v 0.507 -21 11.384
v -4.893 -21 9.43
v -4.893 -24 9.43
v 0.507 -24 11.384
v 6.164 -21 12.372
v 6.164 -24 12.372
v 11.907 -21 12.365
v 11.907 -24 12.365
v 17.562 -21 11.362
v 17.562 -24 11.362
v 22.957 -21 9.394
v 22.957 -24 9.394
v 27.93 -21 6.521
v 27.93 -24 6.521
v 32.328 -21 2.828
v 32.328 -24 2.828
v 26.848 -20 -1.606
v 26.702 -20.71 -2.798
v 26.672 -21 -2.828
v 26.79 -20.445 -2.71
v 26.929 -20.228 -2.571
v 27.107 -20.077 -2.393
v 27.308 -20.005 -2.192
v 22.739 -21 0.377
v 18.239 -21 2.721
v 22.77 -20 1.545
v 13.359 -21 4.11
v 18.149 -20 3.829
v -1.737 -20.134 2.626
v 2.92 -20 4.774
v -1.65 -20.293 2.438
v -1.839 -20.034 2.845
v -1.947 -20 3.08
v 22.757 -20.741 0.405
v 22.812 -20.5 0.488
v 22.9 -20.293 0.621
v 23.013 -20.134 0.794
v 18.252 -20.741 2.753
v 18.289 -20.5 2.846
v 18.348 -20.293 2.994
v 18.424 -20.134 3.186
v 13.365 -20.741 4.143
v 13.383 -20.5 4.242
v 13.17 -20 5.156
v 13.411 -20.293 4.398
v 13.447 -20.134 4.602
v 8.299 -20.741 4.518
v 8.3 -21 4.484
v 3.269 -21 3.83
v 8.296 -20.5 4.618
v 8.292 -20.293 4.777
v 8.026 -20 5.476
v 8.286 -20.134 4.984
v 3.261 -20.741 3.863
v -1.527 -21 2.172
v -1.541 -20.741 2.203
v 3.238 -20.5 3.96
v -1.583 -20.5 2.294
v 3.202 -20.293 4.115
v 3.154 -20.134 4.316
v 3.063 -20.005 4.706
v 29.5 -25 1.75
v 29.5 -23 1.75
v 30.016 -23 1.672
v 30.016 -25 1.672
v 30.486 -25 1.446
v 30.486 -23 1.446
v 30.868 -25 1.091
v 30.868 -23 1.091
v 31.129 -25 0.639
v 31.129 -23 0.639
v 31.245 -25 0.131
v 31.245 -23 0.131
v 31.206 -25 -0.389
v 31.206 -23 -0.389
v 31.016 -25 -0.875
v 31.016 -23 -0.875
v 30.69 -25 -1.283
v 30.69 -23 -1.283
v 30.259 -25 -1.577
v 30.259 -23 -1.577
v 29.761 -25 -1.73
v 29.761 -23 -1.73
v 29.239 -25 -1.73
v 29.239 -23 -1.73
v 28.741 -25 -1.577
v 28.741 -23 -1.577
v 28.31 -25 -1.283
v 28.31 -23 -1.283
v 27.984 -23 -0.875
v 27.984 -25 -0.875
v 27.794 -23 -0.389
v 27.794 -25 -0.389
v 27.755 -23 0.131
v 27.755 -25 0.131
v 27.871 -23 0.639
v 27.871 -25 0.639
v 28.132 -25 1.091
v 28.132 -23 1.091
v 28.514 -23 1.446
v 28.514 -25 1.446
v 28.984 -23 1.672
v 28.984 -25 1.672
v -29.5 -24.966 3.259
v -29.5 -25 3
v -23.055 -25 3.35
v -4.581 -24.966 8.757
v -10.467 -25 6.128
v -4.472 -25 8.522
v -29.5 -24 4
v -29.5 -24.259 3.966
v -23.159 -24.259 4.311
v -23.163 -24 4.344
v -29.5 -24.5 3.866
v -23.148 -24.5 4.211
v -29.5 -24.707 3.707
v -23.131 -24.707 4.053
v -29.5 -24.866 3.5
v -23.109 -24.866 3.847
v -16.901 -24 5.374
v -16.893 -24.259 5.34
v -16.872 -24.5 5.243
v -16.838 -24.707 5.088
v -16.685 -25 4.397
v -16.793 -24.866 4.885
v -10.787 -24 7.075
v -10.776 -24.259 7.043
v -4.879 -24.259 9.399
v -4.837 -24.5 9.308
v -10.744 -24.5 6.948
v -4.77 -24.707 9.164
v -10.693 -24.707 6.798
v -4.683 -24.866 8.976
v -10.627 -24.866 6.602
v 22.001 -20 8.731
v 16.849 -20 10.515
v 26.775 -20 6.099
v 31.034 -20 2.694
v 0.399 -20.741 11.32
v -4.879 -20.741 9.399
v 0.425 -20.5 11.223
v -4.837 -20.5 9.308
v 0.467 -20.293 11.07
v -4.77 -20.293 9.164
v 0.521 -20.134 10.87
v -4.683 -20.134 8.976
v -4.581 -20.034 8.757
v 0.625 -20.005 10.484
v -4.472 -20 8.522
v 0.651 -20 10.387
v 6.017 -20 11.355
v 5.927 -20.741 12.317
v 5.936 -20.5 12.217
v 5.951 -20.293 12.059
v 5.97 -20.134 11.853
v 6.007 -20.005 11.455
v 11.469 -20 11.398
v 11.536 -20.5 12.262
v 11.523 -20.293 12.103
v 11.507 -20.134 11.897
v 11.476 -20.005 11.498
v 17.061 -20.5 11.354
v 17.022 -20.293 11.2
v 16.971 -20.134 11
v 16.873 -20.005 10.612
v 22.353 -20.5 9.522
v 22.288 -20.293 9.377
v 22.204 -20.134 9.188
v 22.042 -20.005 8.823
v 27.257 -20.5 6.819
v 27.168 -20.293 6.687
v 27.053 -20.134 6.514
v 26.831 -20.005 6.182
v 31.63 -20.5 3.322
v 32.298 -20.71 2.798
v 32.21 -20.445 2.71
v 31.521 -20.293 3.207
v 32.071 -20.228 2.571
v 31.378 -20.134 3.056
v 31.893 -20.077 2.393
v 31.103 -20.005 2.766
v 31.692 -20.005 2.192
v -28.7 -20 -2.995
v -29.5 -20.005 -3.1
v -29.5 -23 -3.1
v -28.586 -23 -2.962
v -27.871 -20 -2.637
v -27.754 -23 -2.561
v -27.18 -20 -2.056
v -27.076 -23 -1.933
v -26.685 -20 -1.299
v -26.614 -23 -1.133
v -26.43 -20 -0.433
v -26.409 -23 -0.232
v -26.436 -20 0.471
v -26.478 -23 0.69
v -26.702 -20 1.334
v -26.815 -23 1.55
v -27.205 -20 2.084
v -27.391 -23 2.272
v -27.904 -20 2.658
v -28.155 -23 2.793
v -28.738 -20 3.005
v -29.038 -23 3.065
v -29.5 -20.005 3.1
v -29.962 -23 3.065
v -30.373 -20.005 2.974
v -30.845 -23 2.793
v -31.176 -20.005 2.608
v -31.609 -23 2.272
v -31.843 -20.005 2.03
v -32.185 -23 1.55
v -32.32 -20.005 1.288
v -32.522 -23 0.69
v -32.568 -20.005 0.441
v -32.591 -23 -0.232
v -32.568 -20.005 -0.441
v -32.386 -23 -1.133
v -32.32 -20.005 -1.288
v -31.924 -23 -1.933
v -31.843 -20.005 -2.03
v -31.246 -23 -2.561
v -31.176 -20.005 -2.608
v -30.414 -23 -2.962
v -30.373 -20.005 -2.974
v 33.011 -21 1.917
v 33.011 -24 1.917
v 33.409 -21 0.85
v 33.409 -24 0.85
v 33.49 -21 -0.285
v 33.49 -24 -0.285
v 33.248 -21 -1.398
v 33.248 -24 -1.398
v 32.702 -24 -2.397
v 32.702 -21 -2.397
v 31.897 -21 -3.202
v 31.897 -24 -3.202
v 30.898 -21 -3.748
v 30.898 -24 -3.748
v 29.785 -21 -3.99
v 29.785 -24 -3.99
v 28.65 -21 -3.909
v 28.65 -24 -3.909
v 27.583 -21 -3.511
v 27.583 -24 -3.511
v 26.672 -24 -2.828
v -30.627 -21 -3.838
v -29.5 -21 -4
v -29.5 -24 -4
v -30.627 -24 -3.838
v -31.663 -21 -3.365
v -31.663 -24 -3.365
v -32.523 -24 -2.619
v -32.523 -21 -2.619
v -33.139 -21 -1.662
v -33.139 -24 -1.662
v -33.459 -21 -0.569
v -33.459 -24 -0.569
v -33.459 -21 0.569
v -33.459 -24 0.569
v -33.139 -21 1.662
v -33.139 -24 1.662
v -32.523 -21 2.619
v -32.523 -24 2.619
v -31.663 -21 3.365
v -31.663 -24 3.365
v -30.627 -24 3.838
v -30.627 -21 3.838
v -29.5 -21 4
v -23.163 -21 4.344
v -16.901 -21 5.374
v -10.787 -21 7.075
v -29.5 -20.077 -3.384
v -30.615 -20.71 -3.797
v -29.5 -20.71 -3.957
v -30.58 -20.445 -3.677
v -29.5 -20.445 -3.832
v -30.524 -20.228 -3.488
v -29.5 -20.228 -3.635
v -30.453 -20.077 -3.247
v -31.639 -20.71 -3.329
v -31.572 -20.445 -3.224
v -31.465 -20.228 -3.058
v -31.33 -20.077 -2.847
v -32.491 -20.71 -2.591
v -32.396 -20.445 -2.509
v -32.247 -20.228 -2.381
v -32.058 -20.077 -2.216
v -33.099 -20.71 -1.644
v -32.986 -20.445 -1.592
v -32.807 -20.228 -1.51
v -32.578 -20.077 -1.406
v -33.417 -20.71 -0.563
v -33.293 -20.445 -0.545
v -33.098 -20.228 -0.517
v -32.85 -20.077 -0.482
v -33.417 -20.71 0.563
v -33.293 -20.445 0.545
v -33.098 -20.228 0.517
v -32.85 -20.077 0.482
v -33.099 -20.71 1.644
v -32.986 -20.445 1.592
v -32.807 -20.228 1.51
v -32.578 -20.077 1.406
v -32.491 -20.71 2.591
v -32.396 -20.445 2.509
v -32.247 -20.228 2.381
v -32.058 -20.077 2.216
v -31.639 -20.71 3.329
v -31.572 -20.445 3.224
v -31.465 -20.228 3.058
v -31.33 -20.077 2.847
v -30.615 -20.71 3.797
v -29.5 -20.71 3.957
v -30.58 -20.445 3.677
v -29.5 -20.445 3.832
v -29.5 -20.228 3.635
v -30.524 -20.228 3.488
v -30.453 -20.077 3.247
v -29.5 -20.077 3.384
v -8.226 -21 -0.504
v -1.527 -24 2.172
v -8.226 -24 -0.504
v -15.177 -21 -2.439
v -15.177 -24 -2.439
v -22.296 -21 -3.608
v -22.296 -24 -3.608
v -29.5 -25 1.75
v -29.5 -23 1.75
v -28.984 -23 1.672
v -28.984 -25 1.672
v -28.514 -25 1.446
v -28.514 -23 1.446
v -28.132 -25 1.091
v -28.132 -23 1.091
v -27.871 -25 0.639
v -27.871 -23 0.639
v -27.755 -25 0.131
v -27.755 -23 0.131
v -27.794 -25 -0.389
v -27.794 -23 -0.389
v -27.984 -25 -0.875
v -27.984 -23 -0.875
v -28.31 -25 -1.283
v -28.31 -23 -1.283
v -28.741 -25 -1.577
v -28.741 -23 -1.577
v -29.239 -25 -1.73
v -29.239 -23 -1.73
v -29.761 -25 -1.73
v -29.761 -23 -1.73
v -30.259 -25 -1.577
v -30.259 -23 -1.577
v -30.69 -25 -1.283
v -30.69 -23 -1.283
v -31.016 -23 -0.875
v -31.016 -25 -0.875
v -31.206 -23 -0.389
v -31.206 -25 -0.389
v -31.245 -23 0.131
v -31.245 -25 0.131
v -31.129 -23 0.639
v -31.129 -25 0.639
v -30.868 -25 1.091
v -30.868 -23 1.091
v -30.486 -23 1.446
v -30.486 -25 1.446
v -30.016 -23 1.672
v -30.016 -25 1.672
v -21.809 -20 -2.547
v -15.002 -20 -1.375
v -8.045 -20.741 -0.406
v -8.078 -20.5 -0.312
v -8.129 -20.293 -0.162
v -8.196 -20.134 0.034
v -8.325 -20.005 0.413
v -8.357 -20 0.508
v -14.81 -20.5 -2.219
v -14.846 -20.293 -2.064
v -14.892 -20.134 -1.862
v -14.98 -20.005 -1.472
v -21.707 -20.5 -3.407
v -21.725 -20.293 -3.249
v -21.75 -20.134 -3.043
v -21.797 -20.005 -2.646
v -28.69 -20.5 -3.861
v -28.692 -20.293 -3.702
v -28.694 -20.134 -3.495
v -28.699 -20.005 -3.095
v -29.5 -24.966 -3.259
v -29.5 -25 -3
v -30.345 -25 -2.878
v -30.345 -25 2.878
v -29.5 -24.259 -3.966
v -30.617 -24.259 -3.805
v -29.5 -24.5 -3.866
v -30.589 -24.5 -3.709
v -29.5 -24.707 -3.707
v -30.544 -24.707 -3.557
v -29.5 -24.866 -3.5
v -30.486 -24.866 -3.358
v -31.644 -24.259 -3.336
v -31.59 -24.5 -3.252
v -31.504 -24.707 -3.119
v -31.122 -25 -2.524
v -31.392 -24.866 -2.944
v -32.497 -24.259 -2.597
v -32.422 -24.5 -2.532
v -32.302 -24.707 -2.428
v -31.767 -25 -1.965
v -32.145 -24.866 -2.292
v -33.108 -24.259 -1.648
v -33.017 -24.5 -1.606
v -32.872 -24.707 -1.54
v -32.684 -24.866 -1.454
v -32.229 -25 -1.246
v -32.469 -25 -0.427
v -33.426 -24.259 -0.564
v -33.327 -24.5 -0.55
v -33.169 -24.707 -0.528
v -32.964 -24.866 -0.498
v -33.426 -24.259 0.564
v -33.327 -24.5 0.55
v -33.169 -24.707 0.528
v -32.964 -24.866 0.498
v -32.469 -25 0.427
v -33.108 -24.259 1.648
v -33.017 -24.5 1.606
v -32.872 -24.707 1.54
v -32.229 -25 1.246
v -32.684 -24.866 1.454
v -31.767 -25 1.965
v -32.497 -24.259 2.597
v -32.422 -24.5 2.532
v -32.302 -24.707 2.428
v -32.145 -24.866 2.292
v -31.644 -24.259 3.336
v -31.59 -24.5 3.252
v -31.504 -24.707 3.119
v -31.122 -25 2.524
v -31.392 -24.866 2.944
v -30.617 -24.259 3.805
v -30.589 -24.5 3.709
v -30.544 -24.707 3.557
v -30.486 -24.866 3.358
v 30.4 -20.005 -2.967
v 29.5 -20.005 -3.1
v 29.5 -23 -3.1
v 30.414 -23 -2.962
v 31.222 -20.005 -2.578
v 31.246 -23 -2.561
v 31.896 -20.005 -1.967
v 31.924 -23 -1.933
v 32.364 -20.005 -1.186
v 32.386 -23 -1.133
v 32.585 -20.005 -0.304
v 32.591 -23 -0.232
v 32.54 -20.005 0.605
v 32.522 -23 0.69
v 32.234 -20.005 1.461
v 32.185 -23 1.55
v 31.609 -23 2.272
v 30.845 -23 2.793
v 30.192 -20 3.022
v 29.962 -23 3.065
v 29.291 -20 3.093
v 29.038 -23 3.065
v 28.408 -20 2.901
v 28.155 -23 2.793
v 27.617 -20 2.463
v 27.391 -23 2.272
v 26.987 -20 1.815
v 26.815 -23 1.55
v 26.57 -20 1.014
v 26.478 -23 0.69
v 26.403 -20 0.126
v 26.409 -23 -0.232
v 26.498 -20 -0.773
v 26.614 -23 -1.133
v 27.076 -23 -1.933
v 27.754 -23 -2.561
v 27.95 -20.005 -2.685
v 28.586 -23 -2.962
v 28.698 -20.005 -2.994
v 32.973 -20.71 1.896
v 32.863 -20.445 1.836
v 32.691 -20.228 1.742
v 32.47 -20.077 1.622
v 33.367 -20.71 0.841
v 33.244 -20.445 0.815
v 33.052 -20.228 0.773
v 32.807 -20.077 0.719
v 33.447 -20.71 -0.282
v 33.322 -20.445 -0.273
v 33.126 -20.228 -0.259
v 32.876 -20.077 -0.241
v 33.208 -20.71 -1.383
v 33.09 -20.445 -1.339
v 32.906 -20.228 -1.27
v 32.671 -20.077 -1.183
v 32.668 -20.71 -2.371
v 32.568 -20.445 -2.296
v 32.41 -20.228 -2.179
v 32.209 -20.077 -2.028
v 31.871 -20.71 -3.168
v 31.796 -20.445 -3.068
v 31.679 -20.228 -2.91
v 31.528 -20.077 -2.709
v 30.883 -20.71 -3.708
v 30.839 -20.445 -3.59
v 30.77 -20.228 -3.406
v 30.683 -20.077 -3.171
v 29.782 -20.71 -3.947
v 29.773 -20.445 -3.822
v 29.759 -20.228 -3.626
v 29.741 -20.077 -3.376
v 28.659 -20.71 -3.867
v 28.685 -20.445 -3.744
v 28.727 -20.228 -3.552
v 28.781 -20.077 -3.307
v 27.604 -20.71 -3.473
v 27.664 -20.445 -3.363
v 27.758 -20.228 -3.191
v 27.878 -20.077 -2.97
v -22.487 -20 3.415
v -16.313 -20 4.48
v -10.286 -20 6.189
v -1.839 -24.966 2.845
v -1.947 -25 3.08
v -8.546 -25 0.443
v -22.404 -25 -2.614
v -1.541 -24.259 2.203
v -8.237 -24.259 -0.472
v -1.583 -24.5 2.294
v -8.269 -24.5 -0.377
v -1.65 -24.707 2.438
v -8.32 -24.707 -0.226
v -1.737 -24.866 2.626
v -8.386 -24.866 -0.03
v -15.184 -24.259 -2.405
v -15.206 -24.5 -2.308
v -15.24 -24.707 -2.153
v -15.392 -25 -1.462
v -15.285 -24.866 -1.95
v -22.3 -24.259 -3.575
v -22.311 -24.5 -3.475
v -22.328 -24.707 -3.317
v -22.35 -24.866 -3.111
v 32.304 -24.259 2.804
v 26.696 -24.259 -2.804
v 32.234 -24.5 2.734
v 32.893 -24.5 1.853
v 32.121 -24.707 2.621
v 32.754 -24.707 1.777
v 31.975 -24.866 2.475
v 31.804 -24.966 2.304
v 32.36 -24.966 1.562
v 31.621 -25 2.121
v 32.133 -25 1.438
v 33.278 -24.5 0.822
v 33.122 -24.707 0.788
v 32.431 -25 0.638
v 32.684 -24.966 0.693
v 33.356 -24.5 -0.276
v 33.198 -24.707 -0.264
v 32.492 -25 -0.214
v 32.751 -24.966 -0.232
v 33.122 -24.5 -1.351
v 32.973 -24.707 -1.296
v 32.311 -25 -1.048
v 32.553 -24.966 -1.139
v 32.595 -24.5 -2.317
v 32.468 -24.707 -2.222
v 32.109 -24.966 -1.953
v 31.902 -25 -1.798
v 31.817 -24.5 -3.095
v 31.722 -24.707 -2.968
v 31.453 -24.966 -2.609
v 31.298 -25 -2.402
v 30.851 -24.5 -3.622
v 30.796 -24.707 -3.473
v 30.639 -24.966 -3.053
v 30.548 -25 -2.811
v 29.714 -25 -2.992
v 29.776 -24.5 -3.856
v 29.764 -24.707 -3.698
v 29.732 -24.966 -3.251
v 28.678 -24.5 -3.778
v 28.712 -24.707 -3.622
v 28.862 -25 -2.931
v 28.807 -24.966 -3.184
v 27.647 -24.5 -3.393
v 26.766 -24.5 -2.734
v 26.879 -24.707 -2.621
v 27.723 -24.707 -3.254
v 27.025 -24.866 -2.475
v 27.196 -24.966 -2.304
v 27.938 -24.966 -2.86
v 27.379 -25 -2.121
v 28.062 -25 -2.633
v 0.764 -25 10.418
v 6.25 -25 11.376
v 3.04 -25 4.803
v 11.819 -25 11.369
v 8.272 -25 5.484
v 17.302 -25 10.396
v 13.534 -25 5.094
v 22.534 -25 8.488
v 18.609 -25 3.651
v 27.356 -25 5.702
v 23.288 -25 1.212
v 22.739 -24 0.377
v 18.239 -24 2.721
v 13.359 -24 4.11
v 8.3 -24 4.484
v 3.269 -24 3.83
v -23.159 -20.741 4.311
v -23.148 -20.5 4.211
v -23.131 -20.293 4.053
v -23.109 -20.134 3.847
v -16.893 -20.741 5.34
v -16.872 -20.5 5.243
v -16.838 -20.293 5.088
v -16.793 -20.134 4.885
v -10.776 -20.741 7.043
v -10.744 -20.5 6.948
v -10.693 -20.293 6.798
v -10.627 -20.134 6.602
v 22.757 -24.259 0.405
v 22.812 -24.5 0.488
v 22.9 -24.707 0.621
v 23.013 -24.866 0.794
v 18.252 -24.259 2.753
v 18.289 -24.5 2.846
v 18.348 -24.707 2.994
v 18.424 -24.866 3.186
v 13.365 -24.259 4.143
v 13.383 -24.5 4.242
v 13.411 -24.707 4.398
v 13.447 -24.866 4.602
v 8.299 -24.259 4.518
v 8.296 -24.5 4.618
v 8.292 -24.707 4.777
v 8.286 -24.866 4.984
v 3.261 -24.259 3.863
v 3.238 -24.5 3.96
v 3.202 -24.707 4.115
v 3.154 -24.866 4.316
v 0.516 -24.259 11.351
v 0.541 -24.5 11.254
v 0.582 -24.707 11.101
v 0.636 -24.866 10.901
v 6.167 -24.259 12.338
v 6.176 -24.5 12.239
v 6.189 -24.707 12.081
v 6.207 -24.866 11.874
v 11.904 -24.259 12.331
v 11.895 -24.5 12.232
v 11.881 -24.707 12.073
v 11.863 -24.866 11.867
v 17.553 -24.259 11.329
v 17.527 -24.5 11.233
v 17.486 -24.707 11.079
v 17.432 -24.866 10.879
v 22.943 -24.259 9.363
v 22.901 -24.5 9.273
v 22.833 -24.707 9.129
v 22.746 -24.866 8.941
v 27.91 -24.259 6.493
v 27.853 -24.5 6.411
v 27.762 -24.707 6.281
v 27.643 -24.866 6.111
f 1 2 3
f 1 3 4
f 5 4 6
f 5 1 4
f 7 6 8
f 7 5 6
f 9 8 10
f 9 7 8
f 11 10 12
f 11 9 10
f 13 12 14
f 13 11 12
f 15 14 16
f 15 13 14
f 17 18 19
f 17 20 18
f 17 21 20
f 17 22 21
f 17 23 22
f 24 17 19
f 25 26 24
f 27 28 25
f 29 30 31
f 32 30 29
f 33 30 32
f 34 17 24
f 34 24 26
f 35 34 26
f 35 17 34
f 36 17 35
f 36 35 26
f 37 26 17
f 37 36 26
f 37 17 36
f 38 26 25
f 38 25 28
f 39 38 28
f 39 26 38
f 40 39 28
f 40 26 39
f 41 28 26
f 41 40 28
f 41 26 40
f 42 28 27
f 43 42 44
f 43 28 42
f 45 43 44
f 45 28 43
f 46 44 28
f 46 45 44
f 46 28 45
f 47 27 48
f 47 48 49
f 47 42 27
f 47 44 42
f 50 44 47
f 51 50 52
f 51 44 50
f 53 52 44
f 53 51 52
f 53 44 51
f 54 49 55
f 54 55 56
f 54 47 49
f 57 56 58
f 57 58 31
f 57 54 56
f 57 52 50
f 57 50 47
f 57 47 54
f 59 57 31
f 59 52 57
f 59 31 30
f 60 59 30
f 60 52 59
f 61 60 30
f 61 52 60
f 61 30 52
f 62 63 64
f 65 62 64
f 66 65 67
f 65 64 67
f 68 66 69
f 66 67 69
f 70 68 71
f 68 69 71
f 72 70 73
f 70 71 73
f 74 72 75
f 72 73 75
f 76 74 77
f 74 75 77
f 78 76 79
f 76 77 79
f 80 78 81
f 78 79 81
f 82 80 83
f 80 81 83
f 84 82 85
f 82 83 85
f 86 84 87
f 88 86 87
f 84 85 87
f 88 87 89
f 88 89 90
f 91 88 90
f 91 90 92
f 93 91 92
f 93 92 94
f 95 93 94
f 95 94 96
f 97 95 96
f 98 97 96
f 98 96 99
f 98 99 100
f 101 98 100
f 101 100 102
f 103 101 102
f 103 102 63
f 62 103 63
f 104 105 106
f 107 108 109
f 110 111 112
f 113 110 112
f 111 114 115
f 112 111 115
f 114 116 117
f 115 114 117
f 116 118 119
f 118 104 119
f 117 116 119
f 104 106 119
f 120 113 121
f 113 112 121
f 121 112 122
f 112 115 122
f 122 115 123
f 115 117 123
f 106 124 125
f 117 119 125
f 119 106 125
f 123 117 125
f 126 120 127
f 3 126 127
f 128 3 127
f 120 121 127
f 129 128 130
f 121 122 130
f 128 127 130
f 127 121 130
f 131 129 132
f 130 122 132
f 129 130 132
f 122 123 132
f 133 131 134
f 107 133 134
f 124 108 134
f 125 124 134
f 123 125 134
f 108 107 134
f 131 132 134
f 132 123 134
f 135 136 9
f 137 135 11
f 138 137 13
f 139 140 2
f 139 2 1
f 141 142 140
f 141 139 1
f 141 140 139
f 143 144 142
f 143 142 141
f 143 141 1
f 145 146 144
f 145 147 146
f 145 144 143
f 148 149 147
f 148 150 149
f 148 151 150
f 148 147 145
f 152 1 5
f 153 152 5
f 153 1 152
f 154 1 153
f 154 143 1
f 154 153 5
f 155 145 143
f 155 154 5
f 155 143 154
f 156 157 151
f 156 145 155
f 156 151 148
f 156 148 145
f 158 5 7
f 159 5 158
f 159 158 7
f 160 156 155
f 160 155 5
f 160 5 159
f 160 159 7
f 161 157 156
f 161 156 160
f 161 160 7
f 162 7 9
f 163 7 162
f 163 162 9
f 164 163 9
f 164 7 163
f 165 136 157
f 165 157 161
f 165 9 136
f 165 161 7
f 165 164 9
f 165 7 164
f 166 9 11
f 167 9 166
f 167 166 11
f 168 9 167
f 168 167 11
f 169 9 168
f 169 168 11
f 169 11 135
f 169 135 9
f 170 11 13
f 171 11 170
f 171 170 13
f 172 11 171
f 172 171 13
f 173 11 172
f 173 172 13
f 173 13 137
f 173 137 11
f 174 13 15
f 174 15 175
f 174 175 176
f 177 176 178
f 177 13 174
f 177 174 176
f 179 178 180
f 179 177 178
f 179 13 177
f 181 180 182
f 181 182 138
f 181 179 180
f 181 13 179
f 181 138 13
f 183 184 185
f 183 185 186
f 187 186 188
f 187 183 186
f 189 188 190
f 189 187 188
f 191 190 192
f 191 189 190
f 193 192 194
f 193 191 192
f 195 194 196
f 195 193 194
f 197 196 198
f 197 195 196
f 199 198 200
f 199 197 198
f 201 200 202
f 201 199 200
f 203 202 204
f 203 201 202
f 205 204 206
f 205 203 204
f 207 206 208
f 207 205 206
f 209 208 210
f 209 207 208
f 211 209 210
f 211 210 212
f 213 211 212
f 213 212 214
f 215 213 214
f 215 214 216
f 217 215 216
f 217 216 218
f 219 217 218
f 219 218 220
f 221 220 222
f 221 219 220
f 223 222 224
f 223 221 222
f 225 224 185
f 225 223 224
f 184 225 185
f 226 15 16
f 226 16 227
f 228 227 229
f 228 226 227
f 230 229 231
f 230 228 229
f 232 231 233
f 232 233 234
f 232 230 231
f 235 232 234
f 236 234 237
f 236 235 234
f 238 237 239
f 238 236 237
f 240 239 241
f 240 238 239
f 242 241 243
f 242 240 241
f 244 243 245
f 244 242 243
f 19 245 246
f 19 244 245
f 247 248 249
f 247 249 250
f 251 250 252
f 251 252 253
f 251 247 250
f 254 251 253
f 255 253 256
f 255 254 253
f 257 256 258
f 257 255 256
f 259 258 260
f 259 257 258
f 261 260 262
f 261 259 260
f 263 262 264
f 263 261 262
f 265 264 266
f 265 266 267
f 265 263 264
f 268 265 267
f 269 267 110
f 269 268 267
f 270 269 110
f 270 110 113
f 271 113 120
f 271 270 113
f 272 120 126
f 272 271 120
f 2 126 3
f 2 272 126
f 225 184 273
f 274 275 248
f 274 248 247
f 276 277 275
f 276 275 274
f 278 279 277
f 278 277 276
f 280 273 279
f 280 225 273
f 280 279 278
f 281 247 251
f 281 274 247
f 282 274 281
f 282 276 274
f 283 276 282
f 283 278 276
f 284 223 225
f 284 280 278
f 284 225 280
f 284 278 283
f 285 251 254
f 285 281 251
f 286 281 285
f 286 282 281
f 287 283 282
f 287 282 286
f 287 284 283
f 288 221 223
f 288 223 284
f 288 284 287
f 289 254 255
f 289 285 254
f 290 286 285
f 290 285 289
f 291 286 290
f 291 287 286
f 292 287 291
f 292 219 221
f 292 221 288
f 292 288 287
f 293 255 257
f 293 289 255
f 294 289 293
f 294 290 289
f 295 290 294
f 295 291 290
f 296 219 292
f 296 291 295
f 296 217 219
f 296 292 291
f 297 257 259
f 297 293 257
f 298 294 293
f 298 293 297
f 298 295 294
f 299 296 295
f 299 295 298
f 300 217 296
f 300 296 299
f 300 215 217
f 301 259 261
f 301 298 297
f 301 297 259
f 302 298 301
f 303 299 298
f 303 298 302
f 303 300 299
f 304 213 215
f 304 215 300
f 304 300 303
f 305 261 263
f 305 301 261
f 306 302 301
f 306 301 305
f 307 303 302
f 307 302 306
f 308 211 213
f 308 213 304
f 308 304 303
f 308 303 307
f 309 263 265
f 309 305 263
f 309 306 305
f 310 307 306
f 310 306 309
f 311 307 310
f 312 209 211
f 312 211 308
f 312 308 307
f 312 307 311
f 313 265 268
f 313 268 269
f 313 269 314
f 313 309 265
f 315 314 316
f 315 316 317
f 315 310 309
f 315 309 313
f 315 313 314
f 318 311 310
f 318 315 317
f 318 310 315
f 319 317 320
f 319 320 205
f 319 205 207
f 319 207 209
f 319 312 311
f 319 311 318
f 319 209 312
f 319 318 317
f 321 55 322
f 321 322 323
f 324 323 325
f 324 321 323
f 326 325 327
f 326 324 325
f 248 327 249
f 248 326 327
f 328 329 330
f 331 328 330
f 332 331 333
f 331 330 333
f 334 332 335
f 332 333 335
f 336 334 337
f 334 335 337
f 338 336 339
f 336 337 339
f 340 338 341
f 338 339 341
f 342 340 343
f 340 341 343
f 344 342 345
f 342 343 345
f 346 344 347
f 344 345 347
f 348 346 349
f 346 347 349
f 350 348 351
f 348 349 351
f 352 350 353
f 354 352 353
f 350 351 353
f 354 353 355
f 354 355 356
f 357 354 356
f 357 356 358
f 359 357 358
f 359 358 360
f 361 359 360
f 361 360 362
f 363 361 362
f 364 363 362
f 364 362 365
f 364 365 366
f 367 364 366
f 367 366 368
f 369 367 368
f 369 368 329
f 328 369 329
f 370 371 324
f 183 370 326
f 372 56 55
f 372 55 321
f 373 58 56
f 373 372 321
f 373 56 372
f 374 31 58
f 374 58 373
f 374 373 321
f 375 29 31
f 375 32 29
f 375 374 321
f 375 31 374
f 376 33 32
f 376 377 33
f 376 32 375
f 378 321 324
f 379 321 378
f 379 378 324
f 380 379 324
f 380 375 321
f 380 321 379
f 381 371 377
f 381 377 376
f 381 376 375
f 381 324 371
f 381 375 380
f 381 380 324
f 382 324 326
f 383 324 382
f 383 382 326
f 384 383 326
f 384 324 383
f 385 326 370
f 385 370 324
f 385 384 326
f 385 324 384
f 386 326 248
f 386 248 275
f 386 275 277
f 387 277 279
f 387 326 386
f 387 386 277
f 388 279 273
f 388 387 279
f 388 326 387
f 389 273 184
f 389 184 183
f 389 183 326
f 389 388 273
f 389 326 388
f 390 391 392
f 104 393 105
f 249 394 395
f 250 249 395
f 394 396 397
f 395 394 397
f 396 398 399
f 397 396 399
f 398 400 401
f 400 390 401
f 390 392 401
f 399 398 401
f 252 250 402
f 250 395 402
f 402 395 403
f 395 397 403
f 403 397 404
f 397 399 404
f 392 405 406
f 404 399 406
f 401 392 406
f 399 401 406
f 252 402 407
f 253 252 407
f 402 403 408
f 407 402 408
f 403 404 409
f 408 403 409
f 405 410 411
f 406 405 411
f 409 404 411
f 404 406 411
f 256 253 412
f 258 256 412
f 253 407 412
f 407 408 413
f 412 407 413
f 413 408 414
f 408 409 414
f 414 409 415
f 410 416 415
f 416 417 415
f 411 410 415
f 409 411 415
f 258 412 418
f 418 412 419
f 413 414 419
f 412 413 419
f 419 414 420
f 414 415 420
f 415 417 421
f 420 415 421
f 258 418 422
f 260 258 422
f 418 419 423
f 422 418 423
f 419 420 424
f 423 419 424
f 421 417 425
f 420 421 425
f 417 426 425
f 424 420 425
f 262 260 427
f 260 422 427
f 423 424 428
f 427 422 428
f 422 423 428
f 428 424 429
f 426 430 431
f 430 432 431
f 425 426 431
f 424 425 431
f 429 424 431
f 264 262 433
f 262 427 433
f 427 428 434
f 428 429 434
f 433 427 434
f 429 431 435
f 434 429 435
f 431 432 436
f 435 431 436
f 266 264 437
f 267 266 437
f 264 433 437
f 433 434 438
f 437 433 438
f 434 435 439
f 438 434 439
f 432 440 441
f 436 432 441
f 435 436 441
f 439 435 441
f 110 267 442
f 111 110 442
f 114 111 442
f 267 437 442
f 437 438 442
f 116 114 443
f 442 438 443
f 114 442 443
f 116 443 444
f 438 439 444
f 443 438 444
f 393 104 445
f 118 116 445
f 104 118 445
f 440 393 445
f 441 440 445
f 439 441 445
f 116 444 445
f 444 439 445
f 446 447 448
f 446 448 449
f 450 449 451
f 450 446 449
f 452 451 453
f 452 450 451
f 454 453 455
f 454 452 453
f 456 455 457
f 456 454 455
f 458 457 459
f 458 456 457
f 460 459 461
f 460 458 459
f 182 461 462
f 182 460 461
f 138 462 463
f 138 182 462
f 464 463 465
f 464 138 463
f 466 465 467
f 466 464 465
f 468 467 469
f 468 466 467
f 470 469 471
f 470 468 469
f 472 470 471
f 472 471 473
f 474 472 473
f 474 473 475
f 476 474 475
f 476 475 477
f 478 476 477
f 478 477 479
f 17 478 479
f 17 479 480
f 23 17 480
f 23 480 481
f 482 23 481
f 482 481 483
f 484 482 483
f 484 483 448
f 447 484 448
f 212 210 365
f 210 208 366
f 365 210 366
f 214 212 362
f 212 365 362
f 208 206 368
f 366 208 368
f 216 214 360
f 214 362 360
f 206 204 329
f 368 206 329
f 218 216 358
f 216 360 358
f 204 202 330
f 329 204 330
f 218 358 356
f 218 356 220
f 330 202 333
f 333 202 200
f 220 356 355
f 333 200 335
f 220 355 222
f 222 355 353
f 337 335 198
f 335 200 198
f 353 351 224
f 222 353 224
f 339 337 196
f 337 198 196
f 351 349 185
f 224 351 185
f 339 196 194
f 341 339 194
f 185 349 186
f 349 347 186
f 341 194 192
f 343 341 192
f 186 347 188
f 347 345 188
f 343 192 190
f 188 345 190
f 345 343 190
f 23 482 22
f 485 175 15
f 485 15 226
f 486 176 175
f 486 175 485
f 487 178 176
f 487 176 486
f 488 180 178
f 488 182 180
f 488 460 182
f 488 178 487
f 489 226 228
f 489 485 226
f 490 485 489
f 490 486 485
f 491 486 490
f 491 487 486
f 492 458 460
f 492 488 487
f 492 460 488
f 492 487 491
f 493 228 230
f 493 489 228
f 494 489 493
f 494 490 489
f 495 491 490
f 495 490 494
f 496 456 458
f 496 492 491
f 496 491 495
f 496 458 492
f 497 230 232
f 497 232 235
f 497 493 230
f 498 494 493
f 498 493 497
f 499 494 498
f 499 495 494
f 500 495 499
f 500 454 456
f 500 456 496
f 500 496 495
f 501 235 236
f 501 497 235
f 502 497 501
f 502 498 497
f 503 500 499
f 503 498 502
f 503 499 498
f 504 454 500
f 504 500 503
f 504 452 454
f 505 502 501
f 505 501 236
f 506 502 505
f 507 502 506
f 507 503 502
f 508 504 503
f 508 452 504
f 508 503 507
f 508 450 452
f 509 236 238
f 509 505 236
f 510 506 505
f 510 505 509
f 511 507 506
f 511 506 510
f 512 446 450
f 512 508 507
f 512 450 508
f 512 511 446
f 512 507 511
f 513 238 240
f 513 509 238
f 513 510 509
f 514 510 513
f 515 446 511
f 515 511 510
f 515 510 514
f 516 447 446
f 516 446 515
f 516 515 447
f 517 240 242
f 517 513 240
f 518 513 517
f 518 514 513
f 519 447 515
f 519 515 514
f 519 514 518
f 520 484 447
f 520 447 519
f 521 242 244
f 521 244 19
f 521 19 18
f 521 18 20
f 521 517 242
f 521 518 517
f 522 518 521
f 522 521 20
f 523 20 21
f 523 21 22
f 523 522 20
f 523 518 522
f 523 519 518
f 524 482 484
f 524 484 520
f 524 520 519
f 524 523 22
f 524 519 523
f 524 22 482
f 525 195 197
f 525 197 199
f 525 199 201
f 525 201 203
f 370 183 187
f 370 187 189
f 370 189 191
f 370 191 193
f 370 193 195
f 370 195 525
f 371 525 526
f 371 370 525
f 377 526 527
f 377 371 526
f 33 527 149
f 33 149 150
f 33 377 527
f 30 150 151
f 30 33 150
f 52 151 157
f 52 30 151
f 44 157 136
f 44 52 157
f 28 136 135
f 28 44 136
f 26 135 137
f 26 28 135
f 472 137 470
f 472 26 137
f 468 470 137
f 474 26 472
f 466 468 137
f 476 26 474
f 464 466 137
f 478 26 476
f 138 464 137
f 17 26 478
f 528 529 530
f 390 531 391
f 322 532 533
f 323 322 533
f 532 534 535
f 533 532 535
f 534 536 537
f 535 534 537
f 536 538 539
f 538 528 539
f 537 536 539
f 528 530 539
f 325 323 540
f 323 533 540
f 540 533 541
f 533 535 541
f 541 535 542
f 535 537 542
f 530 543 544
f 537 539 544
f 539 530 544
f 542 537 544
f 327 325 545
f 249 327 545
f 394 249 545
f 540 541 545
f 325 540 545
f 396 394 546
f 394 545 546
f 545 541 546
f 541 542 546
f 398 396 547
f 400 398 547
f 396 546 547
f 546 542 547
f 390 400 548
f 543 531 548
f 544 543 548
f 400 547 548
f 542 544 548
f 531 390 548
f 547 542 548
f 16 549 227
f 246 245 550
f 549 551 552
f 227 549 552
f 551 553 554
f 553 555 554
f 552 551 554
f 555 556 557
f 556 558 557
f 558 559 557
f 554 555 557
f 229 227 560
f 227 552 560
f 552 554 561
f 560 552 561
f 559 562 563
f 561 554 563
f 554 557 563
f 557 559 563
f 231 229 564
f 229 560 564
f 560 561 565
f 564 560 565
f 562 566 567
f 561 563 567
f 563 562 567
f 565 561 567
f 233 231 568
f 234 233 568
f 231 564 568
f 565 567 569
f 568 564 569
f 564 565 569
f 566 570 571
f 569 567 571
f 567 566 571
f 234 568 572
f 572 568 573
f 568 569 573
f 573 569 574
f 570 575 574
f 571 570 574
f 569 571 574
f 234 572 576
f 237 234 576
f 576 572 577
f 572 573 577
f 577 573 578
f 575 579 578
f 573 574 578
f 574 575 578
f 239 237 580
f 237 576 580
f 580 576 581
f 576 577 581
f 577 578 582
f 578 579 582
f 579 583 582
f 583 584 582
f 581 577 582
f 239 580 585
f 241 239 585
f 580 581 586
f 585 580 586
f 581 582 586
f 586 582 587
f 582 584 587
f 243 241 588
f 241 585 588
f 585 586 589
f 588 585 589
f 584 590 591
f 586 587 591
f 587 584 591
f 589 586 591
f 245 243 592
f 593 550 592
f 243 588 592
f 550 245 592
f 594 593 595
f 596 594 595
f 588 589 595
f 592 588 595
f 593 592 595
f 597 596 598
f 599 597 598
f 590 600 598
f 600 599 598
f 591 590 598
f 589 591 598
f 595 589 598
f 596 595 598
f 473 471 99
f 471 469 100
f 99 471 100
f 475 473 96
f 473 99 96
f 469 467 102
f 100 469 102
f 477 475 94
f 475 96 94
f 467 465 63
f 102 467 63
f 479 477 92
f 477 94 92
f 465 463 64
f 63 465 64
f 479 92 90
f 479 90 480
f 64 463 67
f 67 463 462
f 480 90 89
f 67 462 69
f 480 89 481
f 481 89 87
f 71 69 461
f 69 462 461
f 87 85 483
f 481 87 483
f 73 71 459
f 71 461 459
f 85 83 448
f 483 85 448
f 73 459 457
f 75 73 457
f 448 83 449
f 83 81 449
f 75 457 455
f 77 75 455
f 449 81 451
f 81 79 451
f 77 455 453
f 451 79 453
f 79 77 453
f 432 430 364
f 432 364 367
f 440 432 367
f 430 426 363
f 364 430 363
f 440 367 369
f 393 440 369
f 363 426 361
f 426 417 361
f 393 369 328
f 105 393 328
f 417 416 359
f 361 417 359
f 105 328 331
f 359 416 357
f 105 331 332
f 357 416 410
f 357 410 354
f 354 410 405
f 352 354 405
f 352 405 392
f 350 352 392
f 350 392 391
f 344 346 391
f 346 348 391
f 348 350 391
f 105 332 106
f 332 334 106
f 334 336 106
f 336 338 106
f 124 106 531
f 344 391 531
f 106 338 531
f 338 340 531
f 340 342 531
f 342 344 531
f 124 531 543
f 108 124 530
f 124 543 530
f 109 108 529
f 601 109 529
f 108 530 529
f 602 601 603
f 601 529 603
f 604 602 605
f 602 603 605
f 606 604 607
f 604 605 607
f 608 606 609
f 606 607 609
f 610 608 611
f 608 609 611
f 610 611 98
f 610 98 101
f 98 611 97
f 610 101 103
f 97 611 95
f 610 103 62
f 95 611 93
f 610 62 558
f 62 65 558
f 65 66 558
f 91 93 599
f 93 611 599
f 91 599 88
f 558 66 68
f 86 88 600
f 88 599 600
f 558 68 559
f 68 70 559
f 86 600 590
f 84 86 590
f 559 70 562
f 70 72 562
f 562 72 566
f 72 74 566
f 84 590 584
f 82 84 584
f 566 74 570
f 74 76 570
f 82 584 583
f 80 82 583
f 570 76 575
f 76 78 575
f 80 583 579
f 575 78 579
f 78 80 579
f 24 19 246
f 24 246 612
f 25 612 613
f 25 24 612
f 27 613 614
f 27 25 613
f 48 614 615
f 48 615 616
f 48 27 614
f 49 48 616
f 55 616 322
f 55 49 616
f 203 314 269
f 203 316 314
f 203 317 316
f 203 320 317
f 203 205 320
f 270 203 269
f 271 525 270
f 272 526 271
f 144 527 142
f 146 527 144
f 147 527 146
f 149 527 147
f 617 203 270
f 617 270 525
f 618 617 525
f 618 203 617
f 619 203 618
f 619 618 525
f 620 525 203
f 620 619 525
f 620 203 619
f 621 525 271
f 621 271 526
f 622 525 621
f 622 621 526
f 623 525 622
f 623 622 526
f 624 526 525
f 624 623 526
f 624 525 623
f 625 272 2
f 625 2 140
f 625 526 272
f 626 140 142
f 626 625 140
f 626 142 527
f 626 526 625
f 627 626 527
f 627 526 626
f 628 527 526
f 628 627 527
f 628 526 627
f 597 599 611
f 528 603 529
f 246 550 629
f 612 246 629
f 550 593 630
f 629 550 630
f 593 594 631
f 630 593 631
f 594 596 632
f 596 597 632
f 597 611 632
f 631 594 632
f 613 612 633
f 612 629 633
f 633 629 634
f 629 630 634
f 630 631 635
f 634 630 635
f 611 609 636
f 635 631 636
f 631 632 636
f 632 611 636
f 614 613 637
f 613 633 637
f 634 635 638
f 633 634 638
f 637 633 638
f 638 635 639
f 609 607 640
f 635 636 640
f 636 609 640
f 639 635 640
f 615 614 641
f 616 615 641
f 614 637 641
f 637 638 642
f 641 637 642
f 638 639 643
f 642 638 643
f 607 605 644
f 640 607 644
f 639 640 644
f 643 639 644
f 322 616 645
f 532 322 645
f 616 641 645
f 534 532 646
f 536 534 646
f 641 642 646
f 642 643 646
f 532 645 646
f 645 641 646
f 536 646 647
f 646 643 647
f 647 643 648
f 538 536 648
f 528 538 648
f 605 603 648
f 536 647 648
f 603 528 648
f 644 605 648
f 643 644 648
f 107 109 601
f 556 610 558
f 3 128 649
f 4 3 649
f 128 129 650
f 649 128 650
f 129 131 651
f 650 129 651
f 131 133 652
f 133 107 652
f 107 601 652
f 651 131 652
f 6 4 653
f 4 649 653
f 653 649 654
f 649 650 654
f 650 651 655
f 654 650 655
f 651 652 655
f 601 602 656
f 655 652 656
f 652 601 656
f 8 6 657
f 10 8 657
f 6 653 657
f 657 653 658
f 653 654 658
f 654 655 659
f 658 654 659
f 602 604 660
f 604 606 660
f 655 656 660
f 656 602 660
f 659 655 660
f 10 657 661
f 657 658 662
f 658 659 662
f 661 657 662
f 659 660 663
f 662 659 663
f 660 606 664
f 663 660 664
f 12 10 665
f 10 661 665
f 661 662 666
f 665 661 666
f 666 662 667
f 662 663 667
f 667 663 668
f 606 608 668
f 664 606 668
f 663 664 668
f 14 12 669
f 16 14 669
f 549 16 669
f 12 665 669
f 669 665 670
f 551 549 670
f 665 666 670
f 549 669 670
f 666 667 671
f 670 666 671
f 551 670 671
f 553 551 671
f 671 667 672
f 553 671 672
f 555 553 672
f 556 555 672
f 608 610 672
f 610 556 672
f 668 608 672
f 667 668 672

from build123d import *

# Parameters (mm, degrees)
SKETCH1_R           = 1.75
BOSS_EXTRUDE1_DEPTH = 5
FILLET1_R           = 1
SKETCH2_R           = 3.1
CUT_EXTRUDE1_DEPTH  = 3
SKETCH3_W           = 83.675621306
SKETCH3_H           = 27.808708761
CUT_EXTRUDE2_DEPTH  = 5


with BuildPart() as part:
    # Sketch1 → Boss-Extrude1 (new body)
    with BuildSketch(Plane(origin=(0, 0, 0), x_dir=(1, 0, 0), z_dir=(0, 1, 0))):
        with BuildLine():
            ThreePointArc((-29.5, 4), (-33.5, 0), (-29.5, -4))
            ThreePointArc((-29.5, -4), (-16.900654795, -5.373538993), (-4.893229568, -9.429626812))
            ThreePointArc((-4.893229568, -9.429626812), (14.756477238, -11.986867848), (32.328427125, -2.828427125))
            ThreePointArc((32.328427125, -2.828427125), (32.328427125, 2.828427125), (26.671572875, 2.828427125))
            ThreePointArc((26.671572875, 2.828427125), (13.359489628, -4.109785544), (-1.526651892, -2.172481729))
            ThreePointArc((-1.526651892, -2.172481729), (-15.176874162, 2.438540137), (-29.5, 4))
        make_face()
        with Locations(Location((-29.5, 0, 0), (0, 0, 270))):
            Circle(SKETCH1_R, mode=Mode.SUBTRACT)
        with Locations(Location((29.5, 0, 0), (0, 0, 270))):
            Circle(SKETCH1_R, mode=Mode.SUBTRACT)
    extrude(amount=BOSS_EXTRUDE1_DEPTH)

    # Fillet1
    fillet1_edges = [part.edges().sort_by_distance(p)[0] for p in [
        (-16.900654795, 5, 5.373538993),
        (14.756477238, 5, 11.986867848),
        (32.328427125, 5, -2.828427125),
        (13.359489628, 5, 4.109785544),
        (-15.176874162, 5, -2.438540137),
        (13.359489628, 0, 4.109785544),
        (32.328427125, 0, -2.828427125),
        (14.756477238, 0, 11.986867848),
        (-16.900654795, 0, 5.373538993),
        (-33.5, 0, 0),
        (-15.176874162, 0, -2.438540137),
        (-33.5, 5, 0),
    ]]
    fillet(fillet1_edges, radius=FILLET1_R)

    # Sketch2 → Cut-Extrude1 (cut)
    with BuildSketch(Plane.XZ):
        with Locations(Location((29.5, 0, 0), (0, 0, 270))):
            Circle(SKETCH2_R)
        with Locations(Location((-29.5, 0, 0), (0, 0, 270))):
            Circle(SKETCH2_R)
    extrude(amount=-CUT_EXTRUDE1_DEPTH, mode=Mode.SUBTRACT)


with BuildPart() as body_2:
    # Mirror1: mirrored copy
    add(part.part.mirror(Plane(origin=(0, -10, 0), x_dir=(0, 0, 1), z_dir=(0, -1, 0))))


with BuildPart() as part_1:
    add(part.part)

    # Sketch3 → Cut-Extrude2 (cut)
    with BuildSketch(Plane.XZ):
        with Locations((4.363579438, 1.855920518)):
            Rectangle(SKETCH3_W, SKETCH3_H)
    extrude(amount=-CUT_EXTRUDE2_DEPTH, mode=Mode.SUBTRACT)


solid = body_2.part
